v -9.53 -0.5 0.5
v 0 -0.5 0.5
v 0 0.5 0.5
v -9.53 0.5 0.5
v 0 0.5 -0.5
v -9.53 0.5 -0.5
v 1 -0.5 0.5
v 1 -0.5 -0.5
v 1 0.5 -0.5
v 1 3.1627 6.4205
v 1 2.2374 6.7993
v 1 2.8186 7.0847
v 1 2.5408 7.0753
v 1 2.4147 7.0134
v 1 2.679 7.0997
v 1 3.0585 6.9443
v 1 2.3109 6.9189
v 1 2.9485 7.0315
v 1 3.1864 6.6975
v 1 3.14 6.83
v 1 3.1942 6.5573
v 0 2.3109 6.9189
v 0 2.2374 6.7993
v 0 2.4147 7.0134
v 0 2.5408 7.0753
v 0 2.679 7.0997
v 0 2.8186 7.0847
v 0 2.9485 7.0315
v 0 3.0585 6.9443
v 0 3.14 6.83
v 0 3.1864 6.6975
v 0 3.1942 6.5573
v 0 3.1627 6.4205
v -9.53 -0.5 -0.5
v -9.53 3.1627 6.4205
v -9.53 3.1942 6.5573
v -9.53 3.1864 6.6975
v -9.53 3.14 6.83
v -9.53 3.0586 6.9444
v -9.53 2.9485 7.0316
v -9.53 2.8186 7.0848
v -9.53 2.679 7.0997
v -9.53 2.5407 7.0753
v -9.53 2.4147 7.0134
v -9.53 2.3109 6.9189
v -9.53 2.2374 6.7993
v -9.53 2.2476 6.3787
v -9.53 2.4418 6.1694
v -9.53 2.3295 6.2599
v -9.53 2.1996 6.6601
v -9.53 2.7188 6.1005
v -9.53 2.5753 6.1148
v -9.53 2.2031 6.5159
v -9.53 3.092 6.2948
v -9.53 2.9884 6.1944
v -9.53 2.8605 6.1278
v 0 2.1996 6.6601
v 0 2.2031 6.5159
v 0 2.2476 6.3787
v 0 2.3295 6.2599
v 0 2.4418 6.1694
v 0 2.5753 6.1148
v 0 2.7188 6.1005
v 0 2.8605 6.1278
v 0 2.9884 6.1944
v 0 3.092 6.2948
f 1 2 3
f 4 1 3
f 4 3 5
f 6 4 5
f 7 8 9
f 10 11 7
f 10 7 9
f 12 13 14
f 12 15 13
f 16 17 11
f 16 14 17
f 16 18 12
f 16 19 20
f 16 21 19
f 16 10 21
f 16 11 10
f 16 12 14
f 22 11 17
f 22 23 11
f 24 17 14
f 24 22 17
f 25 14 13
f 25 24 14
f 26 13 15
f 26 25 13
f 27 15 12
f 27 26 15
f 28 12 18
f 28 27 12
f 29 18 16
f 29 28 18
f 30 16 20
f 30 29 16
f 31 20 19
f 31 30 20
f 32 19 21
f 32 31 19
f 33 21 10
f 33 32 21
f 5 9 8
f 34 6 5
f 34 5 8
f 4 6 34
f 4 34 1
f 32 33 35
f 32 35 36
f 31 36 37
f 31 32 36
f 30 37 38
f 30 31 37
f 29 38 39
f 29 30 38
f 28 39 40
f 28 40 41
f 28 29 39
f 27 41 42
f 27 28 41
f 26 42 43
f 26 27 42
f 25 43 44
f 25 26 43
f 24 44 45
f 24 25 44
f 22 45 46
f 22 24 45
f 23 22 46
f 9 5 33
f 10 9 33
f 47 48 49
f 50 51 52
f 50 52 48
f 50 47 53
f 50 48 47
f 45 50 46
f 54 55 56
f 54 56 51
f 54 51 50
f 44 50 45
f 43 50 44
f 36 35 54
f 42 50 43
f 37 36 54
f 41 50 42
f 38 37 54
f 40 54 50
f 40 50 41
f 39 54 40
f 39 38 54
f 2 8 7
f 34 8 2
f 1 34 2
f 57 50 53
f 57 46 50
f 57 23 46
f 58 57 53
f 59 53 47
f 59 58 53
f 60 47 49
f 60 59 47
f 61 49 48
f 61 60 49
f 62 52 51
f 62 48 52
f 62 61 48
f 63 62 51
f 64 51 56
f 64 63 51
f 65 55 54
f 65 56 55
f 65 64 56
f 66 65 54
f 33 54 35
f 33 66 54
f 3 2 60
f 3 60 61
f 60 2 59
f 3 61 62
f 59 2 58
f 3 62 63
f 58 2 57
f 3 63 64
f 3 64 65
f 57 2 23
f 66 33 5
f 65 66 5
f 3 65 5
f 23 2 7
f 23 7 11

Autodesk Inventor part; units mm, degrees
ref_plane "YZ Plane" through (0, 0, 0) normal (1, 0, 0) x (0, 1, 0)
ref_plane "XZ Plane" through (0, 0, 0) normal (0, 1, 0) x (-1, 0, 0)
ref_plane "XY Plane" through (0, 0, 0) normal (0, 0, 1) x (1, 0, 0)
sketch "Sketch1" plane through (0, 0, 0) normal (1, 0, 0) x (0, 1, 0)
  line L0 (0, 0) -> (2.696, 0)
  line L1 (2.696, 0) -> (2.696, 6.6)
  circle A0 centre (2.696, 6.6) radius 0.5
  line L2 (-0.5, 0.5) -> (0.5, 0.5)
  line L3 (0.5, 0.5) -> (0.5, -0.5)
  line L4 (0.5, -0.5) -> (-0.5, -0.5)
  line L5 (-0.5, -0.5) -> (-0.5, 0.5)
  line L6 (-0.5, 0.5) -> (0.5, -0.5) construction
  line L7 (0.5, 0.5) -> (-0.5, -0.5) construction
  line L8 (0.5, -0.5) -> (3.1627, 6.4205)
  line L9 (-0.5, 0.5) -> (2.2374, 6.7993)
  dimension "d0" = 2.696
  dimension "d1" = 6.6
  dimension "d2" = 1
  dimension "d3" = 1
  dimension "d4" = 1
extrude "Extrusion1" add sketch "Sketch1" along normal blind 1 contours L3 L2 L9 A0 L1 L8 L0 | L3 L4 L5 L2 | L0 L8 L3 | L1 A0 L8 | A0
sketch "Sketch2" plane through (0, 0, 0) normal (-1, 0, 0) x (0, 0, 1)
  line L0 (-0.5, -0.5) -> (0.5, -0.5)
  line L1 (0.5, -0.5) -> (0.5, 0.5)
  line L2 (0.5, 0.5) -> (-0.5, 0.5)
  line L3 (-0.5, 0.5) -> (-0.5, -0.5)
  line L4 (-0.5, -0.5) -> (0.5, 0.5) construction
  line L5 (0.5, -0.5) -> (-0.5, 0.5) construction
  arc A0 (6.7993, 2.2374) -> (6.4205, 3.1627) centre (6.6, 2.696) ccw projected
  circle A1 centre (6.6, 2.696) radius 0.5
  point P0 (0, 0)
  point P1 (6.4205, 3.1627)
  point P2 (6.7993, 2.2374)
  dimension "d7" = 1
  dimension "d8" = 1
extrude "Extrusion2" add sketch "Sketch2" along normal blind 9.53
properties part number "Radius_Bone1_Joint"
